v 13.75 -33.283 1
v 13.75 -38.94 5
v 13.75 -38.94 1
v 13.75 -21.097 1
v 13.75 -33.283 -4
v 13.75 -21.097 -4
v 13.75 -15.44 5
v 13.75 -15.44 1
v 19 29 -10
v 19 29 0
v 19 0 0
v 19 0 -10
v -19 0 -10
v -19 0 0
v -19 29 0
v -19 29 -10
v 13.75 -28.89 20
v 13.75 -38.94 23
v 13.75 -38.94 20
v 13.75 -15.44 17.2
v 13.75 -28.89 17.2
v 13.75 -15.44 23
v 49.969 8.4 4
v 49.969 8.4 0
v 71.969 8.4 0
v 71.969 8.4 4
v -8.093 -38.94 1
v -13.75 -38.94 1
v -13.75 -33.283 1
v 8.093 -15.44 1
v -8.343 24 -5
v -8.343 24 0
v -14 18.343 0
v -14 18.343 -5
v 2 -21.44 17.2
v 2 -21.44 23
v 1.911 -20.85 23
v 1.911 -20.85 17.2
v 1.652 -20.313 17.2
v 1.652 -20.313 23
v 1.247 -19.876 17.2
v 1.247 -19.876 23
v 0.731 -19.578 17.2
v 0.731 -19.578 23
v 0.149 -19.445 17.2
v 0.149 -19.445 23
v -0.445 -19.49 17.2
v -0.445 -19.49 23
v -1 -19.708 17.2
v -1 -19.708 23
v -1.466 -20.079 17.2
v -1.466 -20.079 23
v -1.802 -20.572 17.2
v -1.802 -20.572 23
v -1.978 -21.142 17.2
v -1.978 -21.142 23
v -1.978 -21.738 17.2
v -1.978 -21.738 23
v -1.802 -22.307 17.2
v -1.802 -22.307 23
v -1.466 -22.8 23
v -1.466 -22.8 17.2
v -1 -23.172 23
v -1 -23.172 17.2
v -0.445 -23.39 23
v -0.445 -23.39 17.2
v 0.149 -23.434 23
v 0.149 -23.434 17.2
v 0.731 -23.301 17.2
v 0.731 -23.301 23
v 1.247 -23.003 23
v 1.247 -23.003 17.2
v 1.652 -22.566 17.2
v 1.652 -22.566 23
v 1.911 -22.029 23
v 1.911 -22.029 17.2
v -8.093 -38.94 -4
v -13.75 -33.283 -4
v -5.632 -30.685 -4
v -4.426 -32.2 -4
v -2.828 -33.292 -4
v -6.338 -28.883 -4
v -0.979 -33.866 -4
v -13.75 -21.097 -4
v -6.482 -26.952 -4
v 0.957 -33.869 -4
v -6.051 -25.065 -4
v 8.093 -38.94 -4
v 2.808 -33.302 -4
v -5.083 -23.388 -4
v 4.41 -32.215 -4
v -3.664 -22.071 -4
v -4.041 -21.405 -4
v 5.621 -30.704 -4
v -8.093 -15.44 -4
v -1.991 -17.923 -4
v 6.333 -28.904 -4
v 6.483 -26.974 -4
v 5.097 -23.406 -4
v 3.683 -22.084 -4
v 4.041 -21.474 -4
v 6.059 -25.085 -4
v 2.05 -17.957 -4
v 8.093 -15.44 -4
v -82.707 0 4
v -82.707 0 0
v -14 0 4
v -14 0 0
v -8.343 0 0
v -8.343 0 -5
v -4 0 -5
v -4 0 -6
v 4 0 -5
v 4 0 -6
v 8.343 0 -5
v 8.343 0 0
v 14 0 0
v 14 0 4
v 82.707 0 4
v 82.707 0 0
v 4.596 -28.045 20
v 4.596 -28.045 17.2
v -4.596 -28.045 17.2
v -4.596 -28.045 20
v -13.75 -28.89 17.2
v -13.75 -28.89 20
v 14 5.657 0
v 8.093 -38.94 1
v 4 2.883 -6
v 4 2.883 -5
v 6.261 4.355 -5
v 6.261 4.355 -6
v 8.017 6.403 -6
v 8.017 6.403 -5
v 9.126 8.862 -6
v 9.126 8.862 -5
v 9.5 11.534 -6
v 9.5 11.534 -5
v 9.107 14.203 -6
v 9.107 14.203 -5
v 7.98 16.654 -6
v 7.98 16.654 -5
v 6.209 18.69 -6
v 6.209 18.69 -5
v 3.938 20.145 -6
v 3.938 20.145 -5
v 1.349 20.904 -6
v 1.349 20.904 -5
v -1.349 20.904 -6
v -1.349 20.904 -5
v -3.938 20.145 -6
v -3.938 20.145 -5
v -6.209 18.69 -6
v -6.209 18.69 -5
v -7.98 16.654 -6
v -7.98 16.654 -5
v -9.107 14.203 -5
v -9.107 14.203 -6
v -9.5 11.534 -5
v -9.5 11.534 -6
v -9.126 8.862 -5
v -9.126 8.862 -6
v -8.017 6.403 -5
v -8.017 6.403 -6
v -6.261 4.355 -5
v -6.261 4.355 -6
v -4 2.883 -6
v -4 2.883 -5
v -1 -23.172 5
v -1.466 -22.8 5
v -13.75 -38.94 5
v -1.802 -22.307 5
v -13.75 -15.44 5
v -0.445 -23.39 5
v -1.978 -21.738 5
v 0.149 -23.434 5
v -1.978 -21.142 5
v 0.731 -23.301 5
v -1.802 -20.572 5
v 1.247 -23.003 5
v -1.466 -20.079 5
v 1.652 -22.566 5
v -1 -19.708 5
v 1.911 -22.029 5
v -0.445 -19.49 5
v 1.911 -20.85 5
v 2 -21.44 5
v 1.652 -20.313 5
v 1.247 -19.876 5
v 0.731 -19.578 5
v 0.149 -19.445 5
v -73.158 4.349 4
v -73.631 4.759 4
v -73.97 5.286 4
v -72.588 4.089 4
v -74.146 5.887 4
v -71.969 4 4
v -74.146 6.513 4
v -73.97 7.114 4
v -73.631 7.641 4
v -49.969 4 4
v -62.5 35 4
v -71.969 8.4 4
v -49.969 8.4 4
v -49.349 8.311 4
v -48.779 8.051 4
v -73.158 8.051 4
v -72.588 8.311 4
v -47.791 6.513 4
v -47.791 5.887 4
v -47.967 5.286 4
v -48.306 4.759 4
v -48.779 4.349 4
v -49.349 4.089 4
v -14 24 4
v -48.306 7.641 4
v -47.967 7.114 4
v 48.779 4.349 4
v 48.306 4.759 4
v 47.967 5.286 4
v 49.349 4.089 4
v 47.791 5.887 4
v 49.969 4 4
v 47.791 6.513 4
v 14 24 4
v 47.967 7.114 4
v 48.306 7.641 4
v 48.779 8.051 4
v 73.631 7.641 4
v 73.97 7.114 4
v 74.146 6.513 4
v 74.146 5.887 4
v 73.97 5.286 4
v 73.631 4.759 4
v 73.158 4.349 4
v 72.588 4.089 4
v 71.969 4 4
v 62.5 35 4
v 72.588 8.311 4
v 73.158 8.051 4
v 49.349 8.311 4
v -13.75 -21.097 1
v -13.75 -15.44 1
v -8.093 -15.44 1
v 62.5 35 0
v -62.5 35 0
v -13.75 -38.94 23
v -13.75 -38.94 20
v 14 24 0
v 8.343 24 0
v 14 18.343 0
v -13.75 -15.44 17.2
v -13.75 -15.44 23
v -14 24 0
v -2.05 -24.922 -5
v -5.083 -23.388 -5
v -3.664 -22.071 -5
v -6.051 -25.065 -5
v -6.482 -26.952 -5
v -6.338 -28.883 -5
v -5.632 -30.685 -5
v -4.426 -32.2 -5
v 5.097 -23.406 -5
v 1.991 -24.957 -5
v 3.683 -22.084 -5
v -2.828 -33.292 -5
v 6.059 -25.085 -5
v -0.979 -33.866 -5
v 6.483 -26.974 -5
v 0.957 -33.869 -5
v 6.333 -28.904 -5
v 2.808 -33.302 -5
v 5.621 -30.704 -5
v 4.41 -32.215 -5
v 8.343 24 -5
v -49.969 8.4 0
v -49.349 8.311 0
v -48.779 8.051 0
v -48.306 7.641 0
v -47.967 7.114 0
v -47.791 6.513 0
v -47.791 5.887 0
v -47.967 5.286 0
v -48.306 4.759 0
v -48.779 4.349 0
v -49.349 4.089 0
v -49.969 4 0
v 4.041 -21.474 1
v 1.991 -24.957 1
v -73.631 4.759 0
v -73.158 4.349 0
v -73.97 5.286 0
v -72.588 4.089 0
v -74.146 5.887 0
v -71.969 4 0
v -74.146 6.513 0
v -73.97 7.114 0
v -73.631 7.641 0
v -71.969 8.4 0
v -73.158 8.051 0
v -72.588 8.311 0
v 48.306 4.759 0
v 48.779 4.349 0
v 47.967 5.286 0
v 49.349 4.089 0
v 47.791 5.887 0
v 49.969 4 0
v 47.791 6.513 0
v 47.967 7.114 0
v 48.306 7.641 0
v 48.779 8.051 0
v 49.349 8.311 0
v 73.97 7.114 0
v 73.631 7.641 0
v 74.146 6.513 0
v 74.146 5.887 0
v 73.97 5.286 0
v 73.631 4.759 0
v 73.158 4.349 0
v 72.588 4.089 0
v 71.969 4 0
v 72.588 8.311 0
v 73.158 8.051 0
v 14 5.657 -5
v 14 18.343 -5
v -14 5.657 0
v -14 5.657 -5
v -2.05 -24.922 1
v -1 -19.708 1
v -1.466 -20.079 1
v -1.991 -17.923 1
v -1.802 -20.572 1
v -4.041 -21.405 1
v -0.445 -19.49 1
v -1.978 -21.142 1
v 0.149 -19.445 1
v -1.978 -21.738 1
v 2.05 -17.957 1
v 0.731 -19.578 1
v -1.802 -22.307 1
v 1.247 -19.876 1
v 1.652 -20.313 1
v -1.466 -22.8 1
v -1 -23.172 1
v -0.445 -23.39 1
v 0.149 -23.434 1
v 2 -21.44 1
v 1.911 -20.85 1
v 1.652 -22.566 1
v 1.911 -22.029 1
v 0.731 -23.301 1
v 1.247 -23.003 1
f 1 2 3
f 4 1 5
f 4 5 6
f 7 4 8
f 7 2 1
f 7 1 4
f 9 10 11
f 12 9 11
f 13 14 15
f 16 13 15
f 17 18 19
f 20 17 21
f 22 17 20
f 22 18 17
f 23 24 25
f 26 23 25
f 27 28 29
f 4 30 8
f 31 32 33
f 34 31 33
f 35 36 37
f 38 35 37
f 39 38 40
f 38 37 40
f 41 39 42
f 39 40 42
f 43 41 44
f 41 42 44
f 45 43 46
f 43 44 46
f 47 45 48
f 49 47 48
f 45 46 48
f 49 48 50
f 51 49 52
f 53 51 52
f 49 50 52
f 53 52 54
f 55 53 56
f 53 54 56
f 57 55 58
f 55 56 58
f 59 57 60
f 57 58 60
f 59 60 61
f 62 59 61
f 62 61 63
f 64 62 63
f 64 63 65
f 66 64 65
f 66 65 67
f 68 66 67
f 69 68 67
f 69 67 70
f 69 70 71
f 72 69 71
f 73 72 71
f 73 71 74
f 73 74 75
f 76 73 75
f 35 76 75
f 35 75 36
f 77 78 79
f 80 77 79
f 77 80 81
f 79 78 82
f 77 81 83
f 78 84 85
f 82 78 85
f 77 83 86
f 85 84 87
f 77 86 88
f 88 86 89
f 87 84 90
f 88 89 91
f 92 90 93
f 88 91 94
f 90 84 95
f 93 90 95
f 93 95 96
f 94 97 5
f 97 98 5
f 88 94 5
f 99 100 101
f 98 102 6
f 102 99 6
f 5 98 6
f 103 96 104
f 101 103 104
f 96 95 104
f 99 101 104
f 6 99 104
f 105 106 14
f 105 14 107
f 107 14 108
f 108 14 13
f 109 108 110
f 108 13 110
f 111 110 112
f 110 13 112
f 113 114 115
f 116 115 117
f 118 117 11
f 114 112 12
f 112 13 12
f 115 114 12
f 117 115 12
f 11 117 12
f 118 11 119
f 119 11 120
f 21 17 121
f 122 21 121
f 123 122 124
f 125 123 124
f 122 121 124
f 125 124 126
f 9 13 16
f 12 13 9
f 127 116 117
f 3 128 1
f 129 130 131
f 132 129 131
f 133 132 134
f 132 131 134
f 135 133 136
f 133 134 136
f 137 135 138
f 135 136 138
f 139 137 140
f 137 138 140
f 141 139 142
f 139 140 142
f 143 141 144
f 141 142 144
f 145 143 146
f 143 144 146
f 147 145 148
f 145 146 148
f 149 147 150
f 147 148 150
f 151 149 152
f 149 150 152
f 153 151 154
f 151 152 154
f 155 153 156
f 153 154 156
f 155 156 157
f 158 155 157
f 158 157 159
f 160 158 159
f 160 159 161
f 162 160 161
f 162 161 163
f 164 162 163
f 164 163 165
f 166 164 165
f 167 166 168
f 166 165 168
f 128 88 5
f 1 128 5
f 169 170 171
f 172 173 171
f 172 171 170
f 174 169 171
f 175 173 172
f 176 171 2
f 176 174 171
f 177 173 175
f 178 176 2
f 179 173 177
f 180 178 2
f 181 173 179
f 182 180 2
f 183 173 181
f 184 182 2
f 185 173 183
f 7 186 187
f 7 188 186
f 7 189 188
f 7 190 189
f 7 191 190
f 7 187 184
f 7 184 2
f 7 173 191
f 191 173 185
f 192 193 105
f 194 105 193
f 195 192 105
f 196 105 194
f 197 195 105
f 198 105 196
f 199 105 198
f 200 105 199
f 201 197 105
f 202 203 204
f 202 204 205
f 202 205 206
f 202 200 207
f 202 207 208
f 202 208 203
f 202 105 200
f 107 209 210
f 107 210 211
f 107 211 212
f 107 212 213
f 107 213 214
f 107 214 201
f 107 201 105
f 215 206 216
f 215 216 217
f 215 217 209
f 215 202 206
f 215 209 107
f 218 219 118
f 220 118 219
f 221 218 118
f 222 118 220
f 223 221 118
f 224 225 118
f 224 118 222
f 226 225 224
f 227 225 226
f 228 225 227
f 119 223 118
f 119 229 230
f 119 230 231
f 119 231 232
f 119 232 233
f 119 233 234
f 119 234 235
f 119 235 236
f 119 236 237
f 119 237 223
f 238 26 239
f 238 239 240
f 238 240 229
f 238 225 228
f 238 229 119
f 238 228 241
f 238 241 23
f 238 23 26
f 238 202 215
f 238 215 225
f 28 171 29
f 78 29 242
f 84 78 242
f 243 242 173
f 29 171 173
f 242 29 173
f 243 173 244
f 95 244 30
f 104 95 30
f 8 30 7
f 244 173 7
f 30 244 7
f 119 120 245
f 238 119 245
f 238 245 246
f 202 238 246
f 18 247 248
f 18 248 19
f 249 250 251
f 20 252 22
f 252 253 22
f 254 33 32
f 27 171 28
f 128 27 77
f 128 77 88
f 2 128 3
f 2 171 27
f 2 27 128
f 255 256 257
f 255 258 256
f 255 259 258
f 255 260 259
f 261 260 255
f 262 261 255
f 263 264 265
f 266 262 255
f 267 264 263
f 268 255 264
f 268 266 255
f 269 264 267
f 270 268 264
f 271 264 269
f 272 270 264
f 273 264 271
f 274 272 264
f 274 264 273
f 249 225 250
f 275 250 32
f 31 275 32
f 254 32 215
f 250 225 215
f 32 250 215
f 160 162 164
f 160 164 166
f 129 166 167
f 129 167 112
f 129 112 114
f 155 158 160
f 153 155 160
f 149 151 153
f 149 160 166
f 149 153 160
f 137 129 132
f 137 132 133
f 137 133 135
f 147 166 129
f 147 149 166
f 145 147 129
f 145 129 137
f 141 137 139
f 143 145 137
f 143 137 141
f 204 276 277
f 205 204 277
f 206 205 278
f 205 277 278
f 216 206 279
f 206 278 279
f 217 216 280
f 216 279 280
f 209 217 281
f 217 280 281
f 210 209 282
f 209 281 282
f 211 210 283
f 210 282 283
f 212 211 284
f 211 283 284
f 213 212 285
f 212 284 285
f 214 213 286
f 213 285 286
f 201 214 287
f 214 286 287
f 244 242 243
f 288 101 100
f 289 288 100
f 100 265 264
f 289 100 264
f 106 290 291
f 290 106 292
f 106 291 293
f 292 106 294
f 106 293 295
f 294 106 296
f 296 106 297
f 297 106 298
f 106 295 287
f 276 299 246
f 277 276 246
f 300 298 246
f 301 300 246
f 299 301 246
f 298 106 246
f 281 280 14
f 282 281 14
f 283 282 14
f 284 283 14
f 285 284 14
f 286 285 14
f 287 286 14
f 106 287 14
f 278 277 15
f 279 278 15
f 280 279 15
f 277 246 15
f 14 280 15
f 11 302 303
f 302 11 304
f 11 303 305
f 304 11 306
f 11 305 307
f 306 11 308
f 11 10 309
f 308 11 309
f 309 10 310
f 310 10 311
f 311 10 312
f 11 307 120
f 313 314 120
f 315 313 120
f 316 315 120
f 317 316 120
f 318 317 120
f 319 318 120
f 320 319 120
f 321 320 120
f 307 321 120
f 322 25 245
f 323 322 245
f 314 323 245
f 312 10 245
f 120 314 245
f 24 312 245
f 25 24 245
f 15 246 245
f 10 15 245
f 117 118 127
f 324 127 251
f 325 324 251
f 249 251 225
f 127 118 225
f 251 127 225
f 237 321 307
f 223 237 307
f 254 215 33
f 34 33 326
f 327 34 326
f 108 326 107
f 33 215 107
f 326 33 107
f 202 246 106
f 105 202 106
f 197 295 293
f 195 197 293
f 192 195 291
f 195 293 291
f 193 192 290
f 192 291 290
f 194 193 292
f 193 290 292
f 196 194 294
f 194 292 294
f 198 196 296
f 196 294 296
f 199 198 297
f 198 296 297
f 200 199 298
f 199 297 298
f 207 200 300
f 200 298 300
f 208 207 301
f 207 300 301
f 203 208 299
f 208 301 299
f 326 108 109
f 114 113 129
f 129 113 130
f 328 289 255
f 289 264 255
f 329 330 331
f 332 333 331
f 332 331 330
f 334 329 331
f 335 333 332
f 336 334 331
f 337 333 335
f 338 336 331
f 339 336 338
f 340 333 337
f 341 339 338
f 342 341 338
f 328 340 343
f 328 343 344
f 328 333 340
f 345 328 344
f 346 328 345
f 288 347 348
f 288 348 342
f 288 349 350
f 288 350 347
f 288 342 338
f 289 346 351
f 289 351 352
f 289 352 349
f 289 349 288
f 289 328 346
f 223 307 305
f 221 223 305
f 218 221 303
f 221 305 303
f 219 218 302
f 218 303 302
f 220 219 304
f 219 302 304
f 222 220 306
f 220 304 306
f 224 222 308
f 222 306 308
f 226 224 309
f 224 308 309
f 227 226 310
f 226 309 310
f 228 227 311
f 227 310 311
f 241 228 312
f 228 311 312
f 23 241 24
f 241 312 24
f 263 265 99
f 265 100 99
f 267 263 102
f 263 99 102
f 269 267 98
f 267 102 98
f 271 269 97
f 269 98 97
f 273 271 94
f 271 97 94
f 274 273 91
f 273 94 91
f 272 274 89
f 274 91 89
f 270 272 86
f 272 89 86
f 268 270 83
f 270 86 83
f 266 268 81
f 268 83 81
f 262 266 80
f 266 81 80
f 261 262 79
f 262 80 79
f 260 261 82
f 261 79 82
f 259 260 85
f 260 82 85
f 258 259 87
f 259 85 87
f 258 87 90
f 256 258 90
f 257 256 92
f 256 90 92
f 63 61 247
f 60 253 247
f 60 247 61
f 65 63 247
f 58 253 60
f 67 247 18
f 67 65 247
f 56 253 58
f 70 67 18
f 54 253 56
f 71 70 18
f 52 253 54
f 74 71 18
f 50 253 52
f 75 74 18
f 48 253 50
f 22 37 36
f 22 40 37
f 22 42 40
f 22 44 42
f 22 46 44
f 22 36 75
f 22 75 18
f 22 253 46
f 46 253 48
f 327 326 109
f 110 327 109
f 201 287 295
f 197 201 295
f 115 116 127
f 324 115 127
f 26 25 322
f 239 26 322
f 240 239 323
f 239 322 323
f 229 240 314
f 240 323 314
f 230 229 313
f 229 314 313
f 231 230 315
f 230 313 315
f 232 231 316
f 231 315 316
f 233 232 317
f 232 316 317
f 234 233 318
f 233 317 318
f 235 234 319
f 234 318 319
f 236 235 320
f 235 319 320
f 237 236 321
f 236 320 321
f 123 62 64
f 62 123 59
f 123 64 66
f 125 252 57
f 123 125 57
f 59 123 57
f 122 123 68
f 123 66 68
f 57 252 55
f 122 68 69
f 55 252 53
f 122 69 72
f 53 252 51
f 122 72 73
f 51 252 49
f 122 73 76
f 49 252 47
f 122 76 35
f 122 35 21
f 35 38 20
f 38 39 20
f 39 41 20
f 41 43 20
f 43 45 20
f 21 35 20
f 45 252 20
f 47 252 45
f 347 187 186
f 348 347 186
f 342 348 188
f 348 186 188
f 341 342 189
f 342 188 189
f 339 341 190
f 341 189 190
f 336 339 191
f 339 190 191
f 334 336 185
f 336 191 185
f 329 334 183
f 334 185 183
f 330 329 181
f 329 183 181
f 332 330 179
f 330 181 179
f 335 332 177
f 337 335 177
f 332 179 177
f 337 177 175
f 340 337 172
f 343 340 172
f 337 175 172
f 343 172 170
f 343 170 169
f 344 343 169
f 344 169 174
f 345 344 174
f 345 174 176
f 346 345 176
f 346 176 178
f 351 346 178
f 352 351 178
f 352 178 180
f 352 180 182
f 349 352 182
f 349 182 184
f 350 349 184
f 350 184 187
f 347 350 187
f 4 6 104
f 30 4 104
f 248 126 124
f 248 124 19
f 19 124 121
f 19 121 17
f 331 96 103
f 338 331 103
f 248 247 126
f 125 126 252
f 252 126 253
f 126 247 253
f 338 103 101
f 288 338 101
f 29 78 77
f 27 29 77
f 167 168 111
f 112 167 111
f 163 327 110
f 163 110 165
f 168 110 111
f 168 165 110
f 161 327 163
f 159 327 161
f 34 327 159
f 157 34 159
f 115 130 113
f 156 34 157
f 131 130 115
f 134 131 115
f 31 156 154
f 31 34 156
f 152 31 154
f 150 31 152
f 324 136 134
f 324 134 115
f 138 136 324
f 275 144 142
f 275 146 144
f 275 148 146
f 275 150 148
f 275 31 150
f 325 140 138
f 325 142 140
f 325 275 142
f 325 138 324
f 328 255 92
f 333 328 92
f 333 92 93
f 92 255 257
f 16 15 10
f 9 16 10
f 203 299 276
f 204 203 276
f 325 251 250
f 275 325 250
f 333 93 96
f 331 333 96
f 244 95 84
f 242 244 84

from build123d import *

# Parameters (mm, degrees)
F1_DEPTH       = 4
F3_DEPTH       = 10
F6_W           = 28
F6_H           = 24
F7_DEPTH       = 5
F8_DEPTH       = 1
F9_W           = 27.5
F9_H           = 23.5
F10_DEPTH      = 5
F10_DEPTH_BACK = 4
F11_R          = 6.5
F12_DEPTH      = 1
F14_DEPTH      = 5
F16_W          = 27.5
F16_H          = 23.5
F17_DEPTH      = 3
F17_DEPTH_BACK = 2.8
F18_R          = 2
F19_DEPTH      = 50
F21_DEPTH      = 5
F21_DEPTH_BACK = 2
F23_DEPTH      = 25


with BuildPart() as f1:
    # F0 (on Top) → F1 (new body)
    with BuildSketch(Plane.XY):
        Polygon((-14, 35), (-62.5, 35), (-82.7072594216, 0), (-62.5, 0), (-14, 0), (-14, 24), (0, 24), (0, 35), align=None)
        with BuildLine():
            ThreePointArc((-49.9685444147, 8.4), (-47.7685444147, 6.2), (-49.9685444147, 4))
            Line((-49.9685444147, 4), (-71.9685444147, 4))
            ThreePointArc((-71.9685444147, 4), (-74.1685444147, 6.2), (-71.9685444147, 8.4))
            Line((-71.9685444147, 8.4), (-49.9685444147, 8.4))
        make_face(mode=Mode.SUBTRACT)
        Polygon((14, 35), (0, 35), (0, 24), (14, 24), (14, 0), (62.5, 0), (82.7072594216, 0), (62.5, 35), align=None)
        with BuildLine():
            Line((71.9685444147, 4), (49.9685444147, 4))
            ThreePointArc((49.9685444147, 4), (47.7685444147, 6.2), (49.9685444147, 8.4))
            Line((49.9685444147, 8.4), (71.9685444147, 8.4))
            ThreePointArc((71.9685444147, 8.4), (74.1685444147, 6.2), (71.9685444147, 4))
        make_face(mode=Mode.SUBTRACT)
    extrude(amount=F1_DEPTH)

    # F2 (on face) → F3 (join)
    with BuildSketch(Plane(origin=(0, 0, 0), x_dir=(1, 0, 0), z_dir=(0, 0, -1))):
        Polygon((19, -29), (19, 0), (14, 0), (8.3431457505, 0), (14, -5.6568542495), (14, -18.3431457505), (8.3431457505, -24), (-8.3431457505, -24), (-14, -18.3431457505), (-14, -5.6568542495), (-8.3431457505, 0), (-14, 0), (-19, 0), (-19, -29), align=None)
    extrude(amount=F3_DEPTH)

    # F6 (on offset) → F7 (join)
    with BuildSketch(Plane.XY.offset(-5)):
        with Locations((0, 12)):
            Rectangle(F6_W, F6_H)
    extrude(amount=-F7_DEPTH)

    # F5 (on offset) → F8 (cut)
    with BuildSketch(Plane.XY.offset(-5)):
        with BuildLine():
            ThreePointArc((4, 2.8831560302), (8.007808689, 6.3887379249), (9.5, 11.5))
            ThreePointArc((9.5, 11.5), (-5.1112620751, 19.507808689), (-4, 2.8831560302))
            ThreePointArc((-4, 2.8831560302), (0, 2), (4, 2.8831560302))
        make_face()
        with BuildLine():
            ThreePointArc((4, 2.8831560302), (0, 2), (-4, 2.8831560302))
            Line((-4, 2.8831560302), (-4, 0))
            Line((-4, 0), (4, 0))
            Line((4, 0), (4, 2.8831560302))
        make_face()
    extrude(amount=-F8_DEPTH, mode=Mode.SUBTRACT)


with BuildPart() as f10:
    # F9 (on Top) → F10 (new body, two sides)
    with BuildSketch(Plane.XY) as f10_sk:
        with Locations((0, -27.1897088677)):
            Rectangle(F9_W, F9_H)
    extrude(amount=F10_DEPTH)
    extrude(f10_sk.sketch, amount=-F10_DEPTH_BACK)

    # F11 (on face) → F12 (join)
    with BuildSketch(Plane(origin=(0, 0, -4), x_dir=(1, 0, 0), z_dir=(0, 0, -1))):
        with Locations((0, 27.4397088677)):
            Circle(F11_R)
    extrude(amount=F12_DEPTH)

    # F13 (on face) → F14 (cut)
    with BuildSketch(Plane(origin=(0, 0, -4), x_dir=(1, 0, 0), z_dir=(0, 0, -1))):
        Polygon((8.0931457505, 15.4397088677), (13.75, 15.4397088677), (13.75, 21.0965631172), align=None)
        Polygon((8.0931457505, 38.9397088677), (13.75, 33.2828546182), (13.75, 38.9397088677), align=None)
        Polygon((-13.75, 33.2828546182), (-8.0931457505, 38.9397088677), (-13.75, 38.9397088677), align=None)
        Polygon((-13.75, 21.0965631172), (-13.75, 15.4397088677), (-8.0931457505, 15.4397088677), align=None)
    extrude(amount=-F14_DEPTH, mode=Mode.SUBTRACT)


with BuildPart() as f17:
    # F16 (on offset) → F17 (new body, two sides)
    with BuildSketch(Plane.XY.offset(20)) as f17_sk:
        with Locations((0, -27.1897088677)):
            Rectangle(F16_W, F16_H)
    extrude(amount=F17_DEPTH)
    extrude(f17_sk.sketch, amount=-F17_DEPTH_BACK)


with BuildPart() as f19_tool:
    # F18 (on face) → F19 (new body)
    with BuildSketch(Plane.XY.offset(23)):
        with Locations((0, -21.4397088677)):
            Circle(F18_R)
    extrude(amount=-F19_DEPTH)


with BuildPart() as f10_1:
    add(f10.part)

    # F19: cut by f19_tool
    add(f19_tool.part, mode=Mode.SUBTRACT)

    # F20 (on face) → F21 (cut, two sides)
    with BuildSketch(Plane(origin=(0, 0, -4), x_dir=(1, 0, 0), z_dir=(0, 0, -1))) as f21_sk:
        Polygon((-2.050493445, 24.9223529732), (-4.0413049902, 21.4052515068), (-1.9908115452, 17.9226074013), (2.050493445, 17.9570647623), (4.0413049902, 21.4741662287), (1.9908115452, 24.9568103341), align=None)
    extrude(amount=-F21_DEPTH, mode=Mode.SUBTRACT)
    extrude(f21_sk.sketch, amount=F21_DEPTH_BACK, mode=Mode.SUBTRACT)


with BuildPart() as f17_1:
    add(f17.part)

    # F19: cut by f19_tool
    add(f19_tool.part, mode=Mode.SUBTRACT)

    # F22 (on offset) → F23 (cut)
    with BuildSketch(Plane.XY.offset(20)):
        with BuildLine():
            Line((34.0421833098, -52.062548697), (42.4481494773, -37.3960475437))
            ThreePointArc((42.4481494773, -37.3960475437), (3.0553431563, -27.9863953749), (-36.838641718, -34.9724324939))
            Line((-36.838641718, -34.9724324939), (-14.8230902851, -51.8119819462))
            Line((-14.8230902851, -51.8119819462), (34.0421833098, -52.062548697))
        make_face()
    extrude(amount=-F23_DEPTH, mode=Mode.SUBTRACT)


solid = Compound([f1.part, f10_1.part, f17_1.part])
